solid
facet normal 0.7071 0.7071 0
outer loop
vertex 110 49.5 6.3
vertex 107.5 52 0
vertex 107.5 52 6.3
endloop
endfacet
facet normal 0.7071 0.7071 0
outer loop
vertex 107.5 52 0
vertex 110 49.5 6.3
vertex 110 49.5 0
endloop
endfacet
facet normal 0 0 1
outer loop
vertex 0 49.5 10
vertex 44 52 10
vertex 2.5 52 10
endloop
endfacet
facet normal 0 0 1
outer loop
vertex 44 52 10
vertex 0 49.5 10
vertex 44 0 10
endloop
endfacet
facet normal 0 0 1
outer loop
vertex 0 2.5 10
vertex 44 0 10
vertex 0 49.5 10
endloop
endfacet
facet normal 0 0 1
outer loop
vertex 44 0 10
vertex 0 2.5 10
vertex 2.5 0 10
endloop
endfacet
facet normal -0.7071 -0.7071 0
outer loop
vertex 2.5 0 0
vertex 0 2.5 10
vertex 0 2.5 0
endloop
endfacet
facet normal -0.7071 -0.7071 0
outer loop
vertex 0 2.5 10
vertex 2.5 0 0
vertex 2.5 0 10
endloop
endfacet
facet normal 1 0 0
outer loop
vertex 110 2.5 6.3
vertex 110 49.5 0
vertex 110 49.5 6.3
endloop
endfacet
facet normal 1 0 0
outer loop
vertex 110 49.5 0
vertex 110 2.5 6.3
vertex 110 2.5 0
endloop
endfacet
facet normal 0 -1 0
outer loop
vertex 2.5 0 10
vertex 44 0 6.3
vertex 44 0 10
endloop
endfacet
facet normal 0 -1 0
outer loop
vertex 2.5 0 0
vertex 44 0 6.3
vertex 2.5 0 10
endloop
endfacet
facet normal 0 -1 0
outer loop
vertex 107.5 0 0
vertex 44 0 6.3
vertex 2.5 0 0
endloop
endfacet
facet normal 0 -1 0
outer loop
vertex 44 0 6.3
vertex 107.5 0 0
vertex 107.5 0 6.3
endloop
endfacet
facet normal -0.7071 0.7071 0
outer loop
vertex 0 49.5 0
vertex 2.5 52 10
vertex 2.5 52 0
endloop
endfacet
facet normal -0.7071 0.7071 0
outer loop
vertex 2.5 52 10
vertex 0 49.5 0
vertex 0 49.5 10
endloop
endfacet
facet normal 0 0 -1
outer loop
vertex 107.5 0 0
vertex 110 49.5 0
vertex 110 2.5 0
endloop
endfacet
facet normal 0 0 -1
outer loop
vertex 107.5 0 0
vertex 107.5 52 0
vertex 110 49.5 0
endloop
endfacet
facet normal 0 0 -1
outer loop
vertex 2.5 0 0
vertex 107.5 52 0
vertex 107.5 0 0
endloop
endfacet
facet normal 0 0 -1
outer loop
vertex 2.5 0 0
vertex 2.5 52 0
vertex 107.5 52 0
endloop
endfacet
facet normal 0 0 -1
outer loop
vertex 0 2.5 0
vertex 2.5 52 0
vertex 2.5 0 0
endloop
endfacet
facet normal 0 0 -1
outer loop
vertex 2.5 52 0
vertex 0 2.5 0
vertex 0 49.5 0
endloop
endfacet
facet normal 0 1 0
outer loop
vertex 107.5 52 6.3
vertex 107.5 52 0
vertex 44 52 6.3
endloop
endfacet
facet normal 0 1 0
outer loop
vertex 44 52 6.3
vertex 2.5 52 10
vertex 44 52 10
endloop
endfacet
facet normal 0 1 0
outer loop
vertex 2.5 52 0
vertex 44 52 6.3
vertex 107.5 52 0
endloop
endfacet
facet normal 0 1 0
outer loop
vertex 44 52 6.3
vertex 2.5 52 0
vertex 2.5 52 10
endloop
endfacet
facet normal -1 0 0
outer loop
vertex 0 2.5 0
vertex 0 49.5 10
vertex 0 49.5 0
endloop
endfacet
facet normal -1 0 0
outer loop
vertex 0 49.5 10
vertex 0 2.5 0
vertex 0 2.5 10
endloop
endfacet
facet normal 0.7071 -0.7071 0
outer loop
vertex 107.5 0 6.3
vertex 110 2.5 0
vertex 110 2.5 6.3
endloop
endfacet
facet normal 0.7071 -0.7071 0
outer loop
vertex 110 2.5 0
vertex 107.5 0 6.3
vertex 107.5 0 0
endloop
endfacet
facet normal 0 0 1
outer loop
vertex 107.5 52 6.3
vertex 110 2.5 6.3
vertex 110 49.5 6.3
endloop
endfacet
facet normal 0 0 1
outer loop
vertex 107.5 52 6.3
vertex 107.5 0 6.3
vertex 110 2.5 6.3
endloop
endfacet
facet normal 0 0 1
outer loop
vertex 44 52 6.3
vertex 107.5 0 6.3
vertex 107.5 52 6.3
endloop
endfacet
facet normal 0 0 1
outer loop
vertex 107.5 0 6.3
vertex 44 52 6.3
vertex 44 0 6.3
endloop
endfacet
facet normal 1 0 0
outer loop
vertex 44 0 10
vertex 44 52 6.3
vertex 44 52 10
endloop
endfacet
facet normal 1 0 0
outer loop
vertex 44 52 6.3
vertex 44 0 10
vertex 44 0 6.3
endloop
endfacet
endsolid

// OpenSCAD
$fn = 32;

// ----------------------------------------------------------------------
// Stepped bar: endstep, 110 x 52 x 10/6.3 mm
// ----------------------------------------------------------------------

// --- parameters (mm) ---
bar_l = 110;              // bar length, X
bar_w = 52;               // bar width, Y
plate_t = 10;             // thickness of the thick zone, Z
thin_t = 6.3;             // thickness of the thin zone
corner_c = 2.5;           // corner chamfer of the bar
step_cut = 3.7;           // material removed from the thin zone
step_x = 44;              // step position from the left end
depth_1 = 3.7;            // depth of cut 1 from the top face

profile = [[2.5, 0], [107.5, 0], [110, 2.5], [110, 49.5], [107.5, 52], [2.5, 52], [0, 49.5], [0, 2.5]];  // primary outline, 8 points, counter clockwise
void_1 = [[44, -1], [111, -1], [111, 53], [44, 53]];  // thin zone beyond the step, 4 points

// --- the one profile operation ---
difference() {
  linear_extrude(height = plate_t) polygon(points = profile);
  translate([0, 0, plate_t - depth_1])
    linear_extrude(height = depth_1 + 1) polygon(points = void_1);
}
